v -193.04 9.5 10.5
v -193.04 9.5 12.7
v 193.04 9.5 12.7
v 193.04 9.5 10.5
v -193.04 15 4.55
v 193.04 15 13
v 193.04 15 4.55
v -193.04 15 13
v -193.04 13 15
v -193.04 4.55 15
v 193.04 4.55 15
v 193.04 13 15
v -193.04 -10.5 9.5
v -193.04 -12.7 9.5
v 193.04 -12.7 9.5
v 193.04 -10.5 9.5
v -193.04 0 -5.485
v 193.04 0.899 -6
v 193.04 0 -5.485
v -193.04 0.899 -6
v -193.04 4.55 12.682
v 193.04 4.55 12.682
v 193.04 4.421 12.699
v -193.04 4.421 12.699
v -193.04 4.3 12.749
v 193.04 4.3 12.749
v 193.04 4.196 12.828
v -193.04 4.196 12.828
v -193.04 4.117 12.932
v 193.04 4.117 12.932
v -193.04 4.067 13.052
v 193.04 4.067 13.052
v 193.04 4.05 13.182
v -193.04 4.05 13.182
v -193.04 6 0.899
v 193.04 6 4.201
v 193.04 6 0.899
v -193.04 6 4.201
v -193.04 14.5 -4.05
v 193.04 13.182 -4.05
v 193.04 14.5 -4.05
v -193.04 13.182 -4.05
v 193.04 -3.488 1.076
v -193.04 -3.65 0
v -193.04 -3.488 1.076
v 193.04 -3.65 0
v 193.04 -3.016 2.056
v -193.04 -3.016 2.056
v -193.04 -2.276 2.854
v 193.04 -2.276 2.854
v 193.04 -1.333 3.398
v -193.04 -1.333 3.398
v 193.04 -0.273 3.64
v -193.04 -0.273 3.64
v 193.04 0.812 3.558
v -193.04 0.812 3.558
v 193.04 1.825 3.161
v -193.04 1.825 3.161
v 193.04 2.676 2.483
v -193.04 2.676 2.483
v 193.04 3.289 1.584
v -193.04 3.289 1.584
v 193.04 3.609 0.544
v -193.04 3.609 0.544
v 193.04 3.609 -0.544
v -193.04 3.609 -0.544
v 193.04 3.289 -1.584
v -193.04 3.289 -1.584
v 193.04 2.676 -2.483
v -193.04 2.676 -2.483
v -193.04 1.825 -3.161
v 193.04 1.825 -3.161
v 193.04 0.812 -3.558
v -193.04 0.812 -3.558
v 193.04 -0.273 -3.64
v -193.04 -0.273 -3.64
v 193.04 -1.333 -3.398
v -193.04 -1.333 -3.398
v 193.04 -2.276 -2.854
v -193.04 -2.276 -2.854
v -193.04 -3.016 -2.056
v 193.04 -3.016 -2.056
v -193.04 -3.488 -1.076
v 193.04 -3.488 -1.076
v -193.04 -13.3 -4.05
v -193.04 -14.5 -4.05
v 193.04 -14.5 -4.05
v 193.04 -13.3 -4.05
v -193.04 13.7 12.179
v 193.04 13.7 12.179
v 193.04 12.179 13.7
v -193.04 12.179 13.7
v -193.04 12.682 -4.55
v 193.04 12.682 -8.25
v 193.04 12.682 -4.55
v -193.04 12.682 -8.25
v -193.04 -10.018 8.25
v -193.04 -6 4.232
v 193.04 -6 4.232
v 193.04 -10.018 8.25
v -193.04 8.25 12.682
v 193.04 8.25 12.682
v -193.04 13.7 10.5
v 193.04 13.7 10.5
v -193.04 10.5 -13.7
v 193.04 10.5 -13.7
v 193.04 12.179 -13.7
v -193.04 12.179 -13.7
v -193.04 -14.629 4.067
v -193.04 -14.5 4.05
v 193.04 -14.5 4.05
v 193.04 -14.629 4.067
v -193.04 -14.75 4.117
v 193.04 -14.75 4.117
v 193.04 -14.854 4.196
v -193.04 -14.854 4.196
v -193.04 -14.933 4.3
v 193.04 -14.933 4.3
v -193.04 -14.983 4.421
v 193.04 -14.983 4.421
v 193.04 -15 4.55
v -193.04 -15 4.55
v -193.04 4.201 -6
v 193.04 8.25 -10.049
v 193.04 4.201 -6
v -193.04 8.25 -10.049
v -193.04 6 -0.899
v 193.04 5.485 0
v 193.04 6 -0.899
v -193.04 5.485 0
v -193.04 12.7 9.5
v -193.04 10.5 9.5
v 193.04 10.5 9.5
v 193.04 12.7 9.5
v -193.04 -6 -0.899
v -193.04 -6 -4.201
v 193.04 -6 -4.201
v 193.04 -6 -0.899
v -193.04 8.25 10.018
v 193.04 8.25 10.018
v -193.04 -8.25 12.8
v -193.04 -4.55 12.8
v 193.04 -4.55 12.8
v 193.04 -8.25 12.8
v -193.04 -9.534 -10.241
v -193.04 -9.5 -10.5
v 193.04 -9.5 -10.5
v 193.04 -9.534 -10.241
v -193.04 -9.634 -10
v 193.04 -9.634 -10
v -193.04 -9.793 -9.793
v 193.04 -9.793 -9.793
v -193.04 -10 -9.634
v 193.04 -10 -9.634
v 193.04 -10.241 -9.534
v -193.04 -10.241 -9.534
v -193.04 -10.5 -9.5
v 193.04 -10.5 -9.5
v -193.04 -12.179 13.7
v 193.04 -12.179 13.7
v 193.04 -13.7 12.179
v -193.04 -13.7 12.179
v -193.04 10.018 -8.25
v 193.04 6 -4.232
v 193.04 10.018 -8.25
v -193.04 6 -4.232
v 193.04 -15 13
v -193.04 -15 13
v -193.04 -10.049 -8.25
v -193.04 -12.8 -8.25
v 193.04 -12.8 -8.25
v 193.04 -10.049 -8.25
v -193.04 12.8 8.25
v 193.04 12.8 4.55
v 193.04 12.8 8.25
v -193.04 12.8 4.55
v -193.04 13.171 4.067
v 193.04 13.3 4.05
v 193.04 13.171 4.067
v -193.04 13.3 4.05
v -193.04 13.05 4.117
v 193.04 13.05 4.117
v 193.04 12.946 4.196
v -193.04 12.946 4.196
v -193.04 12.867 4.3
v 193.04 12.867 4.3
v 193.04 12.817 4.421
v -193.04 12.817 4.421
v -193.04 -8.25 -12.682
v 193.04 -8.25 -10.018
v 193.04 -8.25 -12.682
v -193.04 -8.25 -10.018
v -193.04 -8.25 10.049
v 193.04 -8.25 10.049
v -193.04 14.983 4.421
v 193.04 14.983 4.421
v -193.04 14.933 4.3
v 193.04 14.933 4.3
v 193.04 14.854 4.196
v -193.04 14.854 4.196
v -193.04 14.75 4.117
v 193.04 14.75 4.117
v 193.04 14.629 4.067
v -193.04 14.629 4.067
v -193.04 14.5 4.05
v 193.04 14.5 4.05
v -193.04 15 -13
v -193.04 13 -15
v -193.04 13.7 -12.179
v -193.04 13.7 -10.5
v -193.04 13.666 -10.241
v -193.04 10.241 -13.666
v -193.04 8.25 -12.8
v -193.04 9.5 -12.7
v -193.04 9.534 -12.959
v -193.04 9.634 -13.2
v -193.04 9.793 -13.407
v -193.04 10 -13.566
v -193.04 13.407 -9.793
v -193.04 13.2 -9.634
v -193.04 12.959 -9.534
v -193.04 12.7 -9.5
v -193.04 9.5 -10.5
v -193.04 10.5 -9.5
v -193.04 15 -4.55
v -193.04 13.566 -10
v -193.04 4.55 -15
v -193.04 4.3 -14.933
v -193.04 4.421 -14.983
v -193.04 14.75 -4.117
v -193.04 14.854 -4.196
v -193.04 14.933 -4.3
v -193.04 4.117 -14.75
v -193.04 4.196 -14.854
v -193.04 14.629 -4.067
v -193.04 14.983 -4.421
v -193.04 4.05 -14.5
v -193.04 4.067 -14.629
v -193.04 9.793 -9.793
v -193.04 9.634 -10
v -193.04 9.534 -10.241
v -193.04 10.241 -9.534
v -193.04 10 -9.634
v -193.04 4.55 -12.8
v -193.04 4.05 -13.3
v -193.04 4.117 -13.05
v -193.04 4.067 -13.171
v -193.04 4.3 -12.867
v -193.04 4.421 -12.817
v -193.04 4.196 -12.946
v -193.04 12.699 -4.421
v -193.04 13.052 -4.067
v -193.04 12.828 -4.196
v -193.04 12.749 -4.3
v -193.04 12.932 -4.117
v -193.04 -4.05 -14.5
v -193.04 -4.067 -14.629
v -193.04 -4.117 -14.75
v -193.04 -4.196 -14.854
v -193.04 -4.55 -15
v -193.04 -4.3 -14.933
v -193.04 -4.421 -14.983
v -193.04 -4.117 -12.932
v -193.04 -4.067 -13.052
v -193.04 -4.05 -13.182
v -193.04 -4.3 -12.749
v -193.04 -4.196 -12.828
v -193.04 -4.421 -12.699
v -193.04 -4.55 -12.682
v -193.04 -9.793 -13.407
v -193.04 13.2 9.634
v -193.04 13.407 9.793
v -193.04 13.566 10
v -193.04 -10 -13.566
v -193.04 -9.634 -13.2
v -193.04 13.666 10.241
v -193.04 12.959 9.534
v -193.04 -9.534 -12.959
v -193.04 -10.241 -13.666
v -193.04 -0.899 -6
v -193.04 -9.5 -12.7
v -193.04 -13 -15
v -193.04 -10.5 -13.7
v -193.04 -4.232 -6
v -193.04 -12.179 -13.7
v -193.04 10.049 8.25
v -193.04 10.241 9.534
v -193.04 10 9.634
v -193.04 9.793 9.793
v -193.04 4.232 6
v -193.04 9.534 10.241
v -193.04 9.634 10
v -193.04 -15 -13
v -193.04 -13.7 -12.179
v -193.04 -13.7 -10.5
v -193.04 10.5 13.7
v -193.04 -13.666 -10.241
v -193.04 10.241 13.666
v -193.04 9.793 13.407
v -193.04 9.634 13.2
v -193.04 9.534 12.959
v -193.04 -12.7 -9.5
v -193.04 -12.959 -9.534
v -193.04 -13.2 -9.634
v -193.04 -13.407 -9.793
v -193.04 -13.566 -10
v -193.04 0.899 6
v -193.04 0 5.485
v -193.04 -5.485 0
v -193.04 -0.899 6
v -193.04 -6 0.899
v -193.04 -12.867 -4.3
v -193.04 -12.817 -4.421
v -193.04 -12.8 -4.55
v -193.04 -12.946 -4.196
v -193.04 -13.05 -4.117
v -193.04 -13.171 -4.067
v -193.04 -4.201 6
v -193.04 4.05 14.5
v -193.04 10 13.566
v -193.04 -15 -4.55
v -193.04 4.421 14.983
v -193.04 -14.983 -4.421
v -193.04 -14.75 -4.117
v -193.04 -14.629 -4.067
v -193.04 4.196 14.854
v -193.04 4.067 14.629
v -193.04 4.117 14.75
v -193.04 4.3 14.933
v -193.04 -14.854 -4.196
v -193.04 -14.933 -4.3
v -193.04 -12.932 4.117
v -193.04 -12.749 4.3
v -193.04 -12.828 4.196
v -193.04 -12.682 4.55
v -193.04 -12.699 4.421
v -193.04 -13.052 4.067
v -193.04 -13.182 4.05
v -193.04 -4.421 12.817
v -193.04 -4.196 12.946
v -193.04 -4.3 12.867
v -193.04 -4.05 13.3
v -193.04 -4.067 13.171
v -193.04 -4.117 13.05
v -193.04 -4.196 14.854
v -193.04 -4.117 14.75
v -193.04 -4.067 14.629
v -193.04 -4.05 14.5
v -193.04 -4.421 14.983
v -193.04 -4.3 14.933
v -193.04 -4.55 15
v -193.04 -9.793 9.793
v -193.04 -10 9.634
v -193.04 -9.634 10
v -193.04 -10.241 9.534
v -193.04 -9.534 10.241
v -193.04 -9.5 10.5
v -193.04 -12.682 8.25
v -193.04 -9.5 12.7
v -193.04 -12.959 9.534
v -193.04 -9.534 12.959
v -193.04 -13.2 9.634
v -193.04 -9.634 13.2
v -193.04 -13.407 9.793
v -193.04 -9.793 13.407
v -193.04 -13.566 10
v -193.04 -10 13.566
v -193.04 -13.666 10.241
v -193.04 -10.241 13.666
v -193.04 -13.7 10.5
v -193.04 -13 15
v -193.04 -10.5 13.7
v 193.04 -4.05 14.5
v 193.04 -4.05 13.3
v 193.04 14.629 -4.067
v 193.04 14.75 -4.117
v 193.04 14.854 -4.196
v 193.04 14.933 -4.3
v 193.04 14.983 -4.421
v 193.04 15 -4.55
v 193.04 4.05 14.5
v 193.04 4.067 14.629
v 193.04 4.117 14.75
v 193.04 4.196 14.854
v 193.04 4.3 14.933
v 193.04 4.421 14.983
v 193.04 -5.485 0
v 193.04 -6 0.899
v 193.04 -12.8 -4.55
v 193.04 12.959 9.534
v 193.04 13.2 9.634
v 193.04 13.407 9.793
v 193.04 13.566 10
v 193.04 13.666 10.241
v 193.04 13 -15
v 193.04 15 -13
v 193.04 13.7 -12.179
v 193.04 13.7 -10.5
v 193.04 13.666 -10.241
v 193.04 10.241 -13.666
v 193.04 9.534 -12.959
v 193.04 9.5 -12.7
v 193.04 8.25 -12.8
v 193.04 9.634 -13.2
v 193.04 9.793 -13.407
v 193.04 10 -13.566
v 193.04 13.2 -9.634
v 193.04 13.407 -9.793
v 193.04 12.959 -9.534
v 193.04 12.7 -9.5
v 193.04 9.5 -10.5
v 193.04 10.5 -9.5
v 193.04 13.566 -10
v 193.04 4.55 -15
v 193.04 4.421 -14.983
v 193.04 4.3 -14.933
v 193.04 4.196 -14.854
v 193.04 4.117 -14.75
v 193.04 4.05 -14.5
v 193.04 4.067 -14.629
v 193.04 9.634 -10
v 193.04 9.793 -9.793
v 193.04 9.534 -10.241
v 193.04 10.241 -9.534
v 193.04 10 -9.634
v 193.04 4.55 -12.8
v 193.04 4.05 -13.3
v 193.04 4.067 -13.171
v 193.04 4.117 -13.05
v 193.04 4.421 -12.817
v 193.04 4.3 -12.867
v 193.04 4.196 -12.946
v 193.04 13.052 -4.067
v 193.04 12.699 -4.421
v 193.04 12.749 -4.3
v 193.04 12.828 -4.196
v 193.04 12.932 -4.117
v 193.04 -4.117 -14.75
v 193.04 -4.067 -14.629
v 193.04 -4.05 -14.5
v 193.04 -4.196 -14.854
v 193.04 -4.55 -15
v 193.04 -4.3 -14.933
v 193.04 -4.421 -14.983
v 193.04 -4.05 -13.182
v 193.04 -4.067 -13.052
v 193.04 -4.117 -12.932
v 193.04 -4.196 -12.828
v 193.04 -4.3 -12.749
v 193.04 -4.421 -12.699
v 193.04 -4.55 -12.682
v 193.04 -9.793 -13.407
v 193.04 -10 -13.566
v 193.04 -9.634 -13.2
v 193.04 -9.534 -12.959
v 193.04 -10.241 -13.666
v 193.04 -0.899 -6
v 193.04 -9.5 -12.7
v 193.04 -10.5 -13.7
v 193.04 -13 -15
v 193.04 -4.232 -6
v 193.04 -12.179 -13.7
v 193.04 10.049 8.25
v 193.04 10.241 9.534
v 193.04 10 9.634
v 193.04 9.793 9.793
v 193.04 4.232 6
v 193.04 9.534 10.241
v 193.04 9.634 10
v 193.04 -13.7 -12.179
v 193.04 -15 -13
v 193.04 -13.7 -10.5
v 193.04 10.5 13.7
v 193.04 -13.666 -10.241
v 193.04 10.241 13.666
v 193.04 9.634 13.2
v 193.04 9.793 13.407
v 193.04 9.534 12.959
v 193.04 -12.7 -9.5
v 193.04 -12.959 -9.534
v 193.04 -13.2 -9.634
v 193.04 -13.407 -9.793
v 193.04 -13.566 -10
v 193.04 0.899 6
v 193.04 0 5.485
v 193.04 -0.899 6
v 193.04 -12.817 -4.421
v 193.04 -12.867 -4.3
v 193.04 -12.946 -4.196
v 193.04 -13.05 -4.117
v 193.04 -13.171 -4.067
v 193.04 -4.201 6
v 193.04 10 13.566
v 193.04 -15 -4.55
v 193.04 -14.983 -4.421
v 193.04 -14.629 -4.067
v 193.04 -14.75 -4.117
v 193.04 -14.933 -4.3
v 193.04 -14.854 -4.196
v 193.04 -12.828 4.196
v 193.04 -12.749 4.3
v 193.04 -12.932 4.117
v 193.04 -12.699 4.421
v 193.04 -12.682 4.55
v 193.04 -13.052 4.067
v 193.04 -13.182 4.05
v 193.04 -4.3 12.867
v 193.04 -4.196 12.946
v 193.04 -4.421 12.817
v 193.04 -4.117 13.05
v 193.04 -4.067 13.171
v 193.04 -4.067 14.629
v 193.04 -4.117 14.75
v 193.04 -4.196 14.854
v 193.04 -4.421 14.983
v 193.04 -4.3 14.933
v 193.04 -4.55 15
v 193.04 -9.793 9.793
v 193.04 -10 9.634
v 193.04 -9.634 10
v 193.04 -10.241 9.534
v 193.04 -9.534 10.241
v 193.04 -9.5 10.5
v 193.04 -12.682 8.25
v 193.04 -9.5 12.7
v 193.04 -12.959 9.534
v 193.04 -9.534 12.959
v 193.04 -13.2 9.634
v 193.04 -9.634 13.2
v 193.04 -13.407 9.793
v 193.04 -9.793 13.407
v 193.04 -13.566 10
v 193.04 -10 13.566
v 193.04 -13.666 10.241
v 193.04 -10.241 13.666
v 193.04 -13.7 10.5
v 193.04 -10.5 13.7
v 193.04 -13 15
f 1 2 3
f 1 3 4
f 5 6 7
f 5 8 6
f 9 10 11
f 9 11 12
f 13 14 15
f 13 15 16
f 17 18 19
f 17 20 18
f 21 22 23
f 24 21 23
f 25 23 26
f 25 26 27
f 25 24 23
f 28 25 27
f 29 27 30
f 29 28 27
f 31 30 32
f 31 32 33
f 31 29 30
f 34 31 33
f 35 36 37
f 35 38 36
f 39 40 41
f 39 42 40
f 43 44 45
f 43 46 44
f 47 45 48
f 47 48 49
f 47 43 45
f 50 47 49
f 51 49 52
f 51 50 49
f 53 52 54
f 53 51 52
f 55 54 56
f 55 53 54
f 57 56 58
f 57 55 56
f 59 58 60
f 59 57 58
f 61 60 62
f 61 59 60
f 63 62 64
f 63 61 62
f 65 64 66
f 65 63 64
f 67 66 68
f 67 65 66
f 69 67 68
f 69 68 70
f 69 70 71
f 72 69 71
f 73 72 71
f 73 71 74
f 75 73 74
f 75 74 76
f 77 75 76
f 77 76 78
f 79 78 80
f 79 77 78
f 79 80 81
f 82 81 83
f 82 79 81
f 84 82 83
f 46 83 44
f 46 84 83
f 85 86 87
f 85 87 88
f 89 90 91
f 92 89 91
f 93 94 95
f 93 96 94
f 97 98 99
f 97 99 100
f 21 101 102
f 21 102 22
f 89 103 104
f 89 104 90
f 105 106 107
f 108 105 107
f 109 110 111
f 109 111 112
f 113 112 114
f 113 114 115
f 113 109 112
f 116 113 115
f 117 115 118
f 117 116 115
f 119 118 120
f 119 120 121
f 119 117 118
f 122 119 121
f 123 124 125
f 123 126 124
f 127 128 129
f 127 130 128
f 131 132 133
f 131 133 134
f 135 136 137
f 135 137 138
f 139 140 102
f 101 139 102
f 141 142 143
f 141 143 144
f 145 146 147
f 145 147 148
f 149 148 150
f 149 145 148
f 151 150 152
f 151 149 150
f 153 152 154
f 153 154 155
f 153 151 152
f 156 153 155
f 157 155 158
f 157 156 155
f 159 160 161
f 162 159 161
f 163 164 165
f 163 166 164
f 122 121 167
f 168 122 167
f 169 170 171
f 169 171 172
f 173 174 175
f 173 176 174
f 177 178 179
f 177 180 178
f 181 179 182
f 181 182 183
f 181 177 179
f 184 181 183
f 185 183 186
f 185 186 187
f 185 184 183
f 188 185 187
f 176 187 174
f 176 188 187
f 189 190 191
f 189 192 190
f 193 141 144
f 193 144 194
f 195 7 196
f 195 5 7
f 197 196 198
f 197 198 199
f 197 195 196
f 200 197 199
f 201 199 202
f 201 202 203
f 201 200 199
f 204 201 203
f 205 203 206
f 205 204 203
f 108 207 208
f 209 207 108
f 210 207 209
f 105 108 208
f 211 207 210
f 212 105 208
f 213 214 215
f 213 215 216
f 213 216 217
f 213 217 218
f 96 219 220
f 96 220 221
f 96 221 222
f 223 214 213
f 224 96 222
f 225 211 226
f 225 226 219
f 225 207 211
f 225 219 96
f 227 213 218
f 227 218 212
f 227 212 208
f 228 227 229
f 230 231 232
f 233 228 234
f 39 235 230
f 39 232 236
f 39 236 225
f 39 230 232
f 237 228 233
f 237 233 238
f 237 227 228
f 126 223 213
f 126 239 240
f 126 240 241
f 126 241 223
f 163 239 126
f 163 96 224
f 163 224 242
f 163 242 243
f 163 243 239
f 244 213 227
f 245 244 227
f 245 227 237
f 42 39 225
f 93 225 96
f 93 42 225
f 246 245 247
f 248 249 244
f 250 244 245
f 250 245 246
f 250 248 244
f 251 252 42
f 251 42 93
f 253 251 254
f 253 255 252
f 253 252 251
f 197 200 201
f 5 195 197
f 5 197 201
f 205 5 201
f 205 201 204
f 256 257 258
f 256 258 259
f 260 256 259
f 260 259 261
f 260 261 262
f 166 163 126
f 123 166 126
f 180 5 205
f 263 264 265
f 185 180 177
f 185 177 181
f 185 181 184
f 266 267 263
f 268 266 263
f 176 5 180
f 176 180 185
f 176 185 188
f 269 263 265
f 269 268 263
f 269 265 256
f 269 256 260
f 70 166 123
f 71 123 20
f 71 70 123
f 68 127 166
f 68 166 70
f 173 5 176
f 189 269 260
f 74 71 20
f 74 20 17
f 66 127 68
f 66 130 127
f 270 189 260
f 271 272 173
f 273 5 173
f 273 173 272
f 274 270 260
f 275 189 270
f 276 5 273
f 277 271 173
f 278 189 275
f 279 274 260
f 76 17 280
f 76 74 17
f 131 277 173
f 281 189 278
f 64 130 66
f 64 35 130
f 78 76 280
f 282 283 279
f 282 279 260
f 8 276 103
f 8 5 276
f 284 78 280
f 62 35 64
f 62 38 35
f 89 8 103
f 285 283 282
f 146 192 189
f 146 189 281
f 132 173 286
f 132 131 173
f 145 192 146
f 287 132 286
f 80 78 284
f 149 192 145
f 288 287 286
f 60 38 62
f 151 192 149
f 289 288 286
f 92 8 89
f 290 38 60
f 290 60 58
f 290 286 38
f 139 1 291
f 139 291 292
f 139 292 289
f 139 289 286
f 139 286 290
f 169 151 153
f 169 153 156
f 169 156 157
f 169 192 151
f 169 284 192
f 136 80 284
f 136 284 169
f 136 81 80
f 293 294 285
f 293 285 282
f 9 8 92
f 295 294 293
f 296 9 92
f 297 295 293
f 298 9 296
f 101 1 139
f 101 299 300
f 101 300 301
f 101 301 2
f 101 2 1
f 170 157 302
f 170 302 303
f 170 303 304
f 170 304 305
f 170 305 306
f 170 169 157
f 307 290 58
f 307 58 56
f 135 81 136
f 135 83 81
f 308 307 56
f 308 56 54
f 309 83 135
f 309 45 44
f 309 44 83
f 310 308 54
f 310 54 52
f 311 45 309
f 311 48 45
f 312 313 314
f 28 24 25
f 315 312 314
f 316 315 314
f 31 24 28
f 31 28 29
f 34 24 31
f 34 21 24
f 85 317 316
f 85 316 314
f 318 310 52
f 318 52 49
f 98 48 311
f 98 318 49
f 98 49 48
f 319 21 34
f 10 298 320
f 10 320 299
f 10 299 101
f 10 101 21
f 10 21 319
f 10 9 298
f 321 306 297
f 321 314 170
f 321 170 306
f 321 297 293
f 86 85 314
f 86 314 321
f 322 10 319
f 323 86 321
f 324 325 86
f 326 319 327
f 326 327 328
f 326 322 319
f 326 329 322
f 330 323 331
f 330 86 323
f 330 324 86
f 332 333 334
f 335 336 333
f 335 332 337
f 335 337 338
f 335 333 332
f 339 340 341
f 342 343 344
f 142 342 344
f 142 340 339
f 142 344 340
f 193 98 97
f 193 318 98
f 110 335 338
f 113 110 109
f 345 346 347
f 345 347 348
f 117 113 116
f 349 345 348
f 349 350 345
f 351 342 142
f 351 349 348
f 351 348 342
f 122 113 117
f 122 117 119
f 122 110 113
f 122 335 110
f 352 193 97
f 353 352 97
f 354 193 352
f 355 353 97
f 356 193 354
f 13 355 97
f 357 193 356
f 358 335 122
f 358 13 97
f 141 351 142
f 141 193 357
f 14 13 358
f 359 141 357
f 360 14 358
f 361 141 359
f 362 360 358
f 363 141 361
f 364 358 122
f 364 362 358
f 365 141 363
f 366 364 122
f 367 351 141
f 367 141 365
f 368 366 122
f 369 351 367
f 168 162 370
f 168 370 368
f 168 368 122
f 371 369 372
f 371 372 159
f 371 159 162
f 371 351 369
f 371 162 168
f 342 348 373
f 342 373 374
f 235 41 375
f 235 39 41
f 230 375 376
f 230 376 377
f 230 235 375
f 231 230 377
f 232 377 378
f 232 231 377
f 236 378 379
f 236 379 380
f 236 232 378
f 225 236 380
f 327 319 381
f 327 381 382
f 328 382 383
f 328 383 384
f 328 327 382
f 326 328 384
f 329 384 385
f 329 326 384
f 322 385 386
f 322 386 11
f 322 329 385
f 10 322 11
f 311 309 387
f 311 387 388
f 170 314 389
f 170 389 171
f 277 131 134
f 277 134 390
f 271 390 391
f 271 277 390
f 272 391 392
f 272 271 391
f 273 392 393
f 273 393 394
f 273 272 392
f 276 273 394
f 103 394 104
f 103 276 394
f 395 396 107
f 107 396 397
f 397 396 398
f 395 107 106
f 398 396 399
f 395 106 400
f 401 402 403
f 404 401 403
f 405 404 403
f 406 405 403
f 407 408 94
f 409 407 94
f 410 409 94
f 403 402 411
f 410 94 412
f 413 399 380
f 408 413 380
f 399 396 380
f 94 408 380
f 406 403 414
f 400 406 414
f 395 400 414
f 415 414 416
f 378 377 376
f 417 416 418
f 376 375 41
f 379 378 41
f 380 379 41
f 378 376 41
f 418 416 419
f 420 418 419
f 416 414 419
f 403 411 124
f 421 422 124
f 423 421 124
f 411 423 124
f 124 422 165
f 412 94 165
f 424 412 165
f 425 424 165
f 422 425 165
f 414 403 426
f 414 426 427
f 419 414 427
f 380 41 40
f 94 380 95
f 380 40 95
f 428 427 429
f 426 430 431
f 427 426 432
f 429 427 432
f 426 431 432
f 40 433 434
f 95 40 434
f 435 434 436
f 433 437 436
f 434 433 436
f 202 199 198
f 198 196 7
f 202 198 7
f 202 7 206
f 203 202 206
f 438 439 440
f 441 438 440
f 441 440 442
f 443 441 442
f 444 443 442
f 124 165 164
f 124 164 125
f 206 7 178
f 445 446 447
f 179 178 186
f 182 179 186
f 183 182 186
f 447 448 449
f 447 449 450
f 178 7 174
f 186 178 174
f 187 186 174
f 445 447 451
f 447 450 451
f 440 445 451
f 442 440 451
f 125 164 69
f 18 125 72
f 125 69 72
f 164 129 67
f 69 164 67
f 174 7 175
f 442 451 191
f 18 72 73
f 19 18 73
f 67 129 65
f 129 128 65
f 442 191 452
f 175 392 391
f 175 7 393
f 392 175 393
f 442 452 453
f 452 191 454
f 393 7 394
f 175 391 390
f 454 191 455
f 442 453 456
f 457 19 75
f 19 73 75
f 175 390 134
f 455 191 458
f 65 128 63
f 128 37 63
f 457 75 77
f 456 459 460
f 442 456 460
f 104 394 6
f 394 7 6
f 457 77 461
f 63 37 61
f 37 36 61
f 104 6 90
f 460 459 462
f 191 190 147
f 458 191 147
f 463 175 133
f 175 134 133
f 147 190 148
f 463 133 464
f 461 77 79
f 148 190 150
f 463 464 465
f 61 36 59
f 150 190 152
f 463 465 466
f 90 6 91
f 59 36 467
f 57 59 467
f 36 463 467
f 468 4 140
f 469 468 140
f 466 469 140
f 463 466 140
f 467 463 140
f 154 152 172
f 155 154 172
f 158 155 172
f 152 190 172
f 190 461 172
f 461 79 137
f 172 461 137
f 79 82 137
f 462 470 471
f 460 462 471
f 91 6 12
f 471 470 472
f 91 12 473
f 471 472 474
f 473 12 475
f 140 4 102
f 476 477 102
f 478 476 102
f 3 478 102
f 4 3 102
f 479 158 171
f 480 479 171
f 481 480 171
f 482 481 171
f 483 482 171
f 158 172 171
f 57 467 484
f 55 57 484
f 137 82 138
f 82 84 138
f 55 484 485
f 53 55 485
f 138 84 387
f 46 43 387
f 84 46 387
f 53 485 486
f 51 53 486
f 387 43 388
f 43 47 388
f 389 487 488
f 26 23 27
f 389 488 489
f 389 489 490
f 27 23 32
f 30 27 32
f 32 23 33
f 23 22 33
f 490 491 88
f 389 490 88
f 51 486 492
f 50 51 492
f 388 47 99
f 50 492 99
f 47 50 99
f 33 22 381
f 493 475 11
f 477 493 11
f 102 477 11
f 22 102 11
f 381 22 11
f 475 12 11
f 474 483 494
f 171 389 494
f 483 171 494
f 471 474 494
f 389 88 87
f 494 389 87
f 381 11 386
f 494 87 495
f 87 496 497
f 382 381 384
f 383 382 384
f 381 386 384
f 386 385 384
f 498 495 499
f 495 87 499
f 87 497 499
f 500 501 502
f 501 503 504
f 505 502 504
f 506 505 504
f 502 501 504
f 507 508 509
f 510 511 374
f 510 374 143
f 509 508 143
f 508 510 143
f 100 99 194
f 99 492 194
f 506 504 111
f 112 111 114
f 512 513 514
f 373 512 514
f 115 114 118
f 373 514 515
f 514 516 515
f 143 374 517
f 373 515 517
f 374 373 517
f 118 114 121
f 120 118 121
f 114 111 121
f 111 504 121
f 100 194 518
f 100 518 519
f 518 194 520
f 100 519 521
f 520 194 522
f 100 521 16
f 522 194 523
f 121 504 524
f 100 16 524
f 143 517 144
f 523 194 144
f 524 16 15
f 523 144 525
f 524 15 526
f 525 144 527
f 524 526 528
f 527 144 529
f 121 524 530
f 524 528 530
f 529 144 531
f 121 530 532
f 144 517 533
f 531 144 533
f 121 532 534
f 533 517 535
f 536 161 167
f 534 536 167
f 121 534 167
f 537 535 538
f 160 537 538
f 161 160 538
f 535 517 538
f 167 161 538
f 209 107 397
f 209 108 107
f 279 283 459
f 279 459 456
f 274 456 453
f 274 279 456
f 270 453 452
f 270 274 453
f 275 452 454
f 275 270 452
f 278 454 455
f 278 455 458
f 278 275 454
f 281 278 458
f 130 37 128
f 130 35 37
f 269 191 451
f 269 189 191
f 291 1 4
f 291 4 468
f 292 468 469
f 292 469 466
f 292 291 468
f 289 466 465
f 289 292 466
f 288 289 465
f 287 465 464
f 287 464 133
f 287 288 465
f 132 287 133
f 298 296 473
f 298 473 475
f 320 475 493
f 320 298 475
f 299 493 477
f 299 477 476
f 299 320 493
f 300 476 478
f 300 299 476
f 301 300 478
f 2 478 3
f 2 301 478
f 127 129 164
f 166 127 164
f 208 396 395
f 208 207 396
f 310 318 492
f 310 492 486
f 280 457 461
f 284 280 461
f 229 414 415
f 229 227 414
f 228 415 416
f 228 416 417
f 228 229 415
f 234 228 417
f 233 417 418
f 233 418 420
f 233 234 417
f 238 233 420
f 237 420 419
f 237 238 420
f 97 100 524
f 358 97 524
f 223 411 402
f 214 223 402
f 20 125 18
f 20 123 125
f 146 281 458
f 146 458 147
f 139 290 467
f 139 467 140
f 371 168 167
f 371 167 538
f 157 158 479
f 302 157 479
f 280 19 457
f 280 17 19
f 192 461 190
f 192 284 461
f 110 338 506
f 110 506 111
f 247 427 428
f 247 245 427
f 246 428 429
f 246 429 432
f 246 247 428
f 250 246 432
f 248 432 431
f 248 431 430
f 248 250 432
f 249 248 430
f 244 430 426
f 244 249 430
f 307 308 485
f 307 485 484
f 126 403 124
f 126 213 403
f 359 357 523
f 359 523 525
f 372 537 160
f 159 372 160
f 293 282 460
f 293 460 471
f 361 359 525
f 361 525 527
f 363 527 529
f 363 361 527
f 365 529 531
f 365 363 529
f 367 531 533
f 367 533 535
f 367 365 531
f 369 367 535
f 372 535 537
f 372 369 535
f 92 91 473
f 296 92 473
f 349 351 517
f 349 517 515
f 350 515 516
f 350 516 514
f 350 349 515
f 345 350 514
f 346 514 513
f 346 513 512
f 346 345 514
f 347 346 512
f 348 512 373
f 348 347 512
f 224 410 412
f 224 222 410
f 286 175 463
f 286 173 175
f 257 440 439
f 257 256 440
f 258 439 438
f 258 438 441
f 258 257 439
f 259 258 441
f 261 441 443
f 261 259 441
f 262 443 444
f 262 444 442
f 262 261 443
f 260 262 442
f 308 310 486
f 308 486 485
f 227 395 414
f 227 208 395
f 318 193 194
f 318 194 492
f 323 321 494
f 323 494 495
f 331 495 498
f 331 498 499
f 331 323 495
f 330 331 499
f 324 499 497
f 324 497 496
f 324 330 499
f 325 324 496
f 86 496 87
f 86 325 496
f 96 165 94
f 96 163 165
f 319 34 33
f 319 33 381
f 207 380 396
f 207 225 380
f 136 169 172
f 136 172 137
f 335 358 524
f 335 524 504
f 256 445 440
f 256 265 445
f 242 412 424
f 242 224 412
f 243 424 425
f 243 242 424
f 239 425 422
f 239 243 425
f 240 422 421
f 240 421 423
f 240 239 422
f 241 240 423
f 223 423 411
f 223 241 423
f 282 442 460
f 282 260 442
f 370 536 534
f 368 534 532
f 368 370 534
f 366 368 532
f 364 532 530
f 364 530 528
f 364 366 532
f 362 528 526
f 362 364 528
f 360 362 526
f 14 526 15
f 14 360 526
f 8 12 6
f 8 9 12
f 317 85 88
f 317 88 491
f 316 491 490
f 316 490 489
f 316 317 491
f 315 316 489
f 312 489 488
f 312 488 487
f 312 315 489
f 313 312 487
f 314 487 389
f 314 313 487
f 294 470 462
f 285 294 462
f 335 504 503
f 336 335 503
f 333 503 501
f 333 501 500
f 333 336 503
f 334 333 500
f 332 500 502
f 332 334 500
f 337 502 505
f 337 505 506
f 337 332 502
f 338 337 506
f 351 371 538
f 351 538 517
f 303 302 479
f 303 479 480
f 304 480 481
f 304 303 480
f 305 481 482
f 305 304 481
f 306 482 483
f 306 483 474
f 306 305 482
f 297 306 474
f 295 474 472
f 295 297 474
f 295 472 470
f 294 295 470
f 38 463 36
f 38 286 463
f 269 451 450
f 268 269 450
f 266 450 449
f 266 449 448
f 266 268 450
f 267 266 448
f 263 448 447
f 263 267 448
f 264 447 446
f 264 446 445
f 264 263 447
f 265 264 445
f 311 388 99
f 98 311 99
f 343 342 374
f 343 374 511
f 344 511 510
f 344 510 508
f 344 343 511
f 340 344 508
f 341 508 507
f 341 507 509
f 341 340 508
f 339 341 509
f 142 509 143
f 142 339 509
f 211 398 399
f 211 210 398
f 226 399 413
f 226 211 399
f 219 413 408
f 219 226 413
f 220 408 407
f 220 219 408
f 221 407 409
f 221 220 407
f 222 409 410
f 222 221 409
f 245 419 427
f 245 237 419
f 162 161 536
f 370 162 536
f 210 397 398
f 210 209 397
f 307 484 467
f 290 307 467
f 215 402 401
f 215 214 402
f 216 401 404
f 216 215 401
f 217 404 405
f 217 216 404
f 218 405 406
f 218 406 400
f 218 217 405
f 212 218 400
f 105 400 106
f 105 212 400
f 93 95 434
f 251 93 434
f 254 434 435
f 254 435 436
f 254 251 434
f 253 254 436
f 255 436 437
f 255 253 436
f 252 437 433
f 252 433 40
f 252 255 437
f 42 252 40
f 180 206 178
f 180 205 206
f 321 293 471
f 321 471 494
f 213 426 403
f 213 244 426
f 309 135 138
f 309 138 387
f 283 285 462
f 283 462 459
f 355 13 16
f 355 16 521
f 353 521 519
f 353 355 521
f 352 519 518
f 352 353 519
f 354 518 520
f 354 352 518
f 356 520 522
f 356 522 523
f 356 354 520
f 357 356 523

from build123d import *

# Parameters (mm, degrees)
SKETCH1_R          = 3.65
MAIN_EXTRUDE_DEPTH = 193.04


with BuildPart() as part:
    # Sketch1 → main Extrude (new body, symmetric)
    with BuildSketch(Plane(origin=(0, 0, 0), x_dir=(0, -1, 0), z_dir=(-1, 0, 0))):
        with BuildLine():
            Line((4.549996167, -15), (12.999943754, -15))
            Line((12.999943754, -15), (15, -12.999944234))
            Line((15, -12.999944234), (15, -4.54998765))
            ThreePointArc((15, -4.54998765), (14.853553391, -4.19643426), (14.5, -4.04998765))
            Line((14.5, -4.04998765), (13.299974565, -4.04998765))
            ThreePointArc((13.299974565, -4.04998765), (12.946421174, -4.19643426), (12.799974565, -4.54998765))
            Line((12.799974565, -4.54998765), (12.799974565, -8.249978163))
            Line((12.799974565, -8.249978163), (10.04886106, -8.249978163))
            Line((10.04886106, -8.249978163), (5.999989561, -4.201106482))
            Line((5.999989561, -4.201106482), (5.999989561, -0.899233628))
            Line((5.999989561, -0.899233628), (5.484990531, 5.429e-06))
            Line((5.484990531, 5.429e-06), (5.999989561, 0.899244177))
            Line((5.999989561, 0.899244177), (5.999989561, 4.232229952))
            Line((5.999989561, 4.232229952), (10.017749022, 8.249988862))
            Line((10.017749022, 8.249988862), (12.681560202, 8.249988862))
            Line((12.681560202, 8.249988862), (12.681560202, 4.549996167))
            ThreePointArc((12.681560202, 4.549996167), (12.828006812, 4.196442776), (13.181560202, 4.049996167))
            Line((13.181560202, 4.049996167), (14.5, 4.049996167))
            ThreePointArc((14.5, 4.049996167), (14.853553391, 4.196442776), (15, 4.549996167))
            Line((15, 4.549996167), (15, 12.999943159))
            Line((15, 12.999943159), (12.999943639, 15))
            Line((12.999943639, 15), (4.54998765, 15))
            ThreePointArc((4.54998765, 15), (4.19643426, 14.853553391), (4.04998765, 14.5))
            Line((4.04998765, 14.5), (4.04998765, 13.299974565))
            ThreePointArc((4.04998765, 13.299974565), (4.19643426, 12.946421174), (4.54998765, 12.799974565))
            Line((4.54998765, 12.799974565), (8.249978163, 12.799974565))
            Line((8.249978163, 12.799974565), (8.249978163, 10.04886106))
            Line((8.249978163, 10.04886106), (4.201106482, 5.999989561))
            Line((4.201106482, 5.999989561), (0.899233628, 5.999989561))
            Line((0.899233628, 5.999989561), (-5.358e-06, 5.484990655))
            Line((-5.358e-06, 5.484990655), (-0.899244177, 5.999989561))
            Line((-0.899244177, 5.999989561), (-4.232229952, 5.999989561))
            Line((-4.232229952, 5.999989561), (-8.249988862, 10.017749022))
            Line((-8.249988862, 10.017749022), (-8.249988862, 12.681560202))
            Line((-8.249988862, 12.681560202), (-4.549996167, 12.681560202))
            ThreePointArc((-4.549996167, 12.681560202), (-4.196442776, 12.828006812), (-4.049996167, 13.181560202))
            Line((-4.049996167, 13.181560202), (-4.049996167, 14.5))
            ThreePointArc((-4.049996167, 14.5), (-4.196442776, 14.853553391), (-4.549996167, 15))
            Line((-4.549996167, 15), (-12.999943355, 15))
            Line((-12.999943355, 15), (-15, 12.999943836))
            Line((-15, 12.999943836), (-15, 4.54998765))
            ThreePointArc((-15, 4.54998765), (-14.853553391, 4.19643426), (-14.5, 4.04998765))
            Line((-14.5, 4.04998765), (-13.299974565, 4.04998765))
            ThreePointArc((-13.299974565, 4.04998765), (-12.946421174, 4.19643426), (-12.799974565, 4.54998765))
            Line((-12.799974565, 4.54998765), (-12.799974565, 8.249978163))
            Line((-12.799974565, 8.249978163), (-10.048860846, 8.249978163))
            Line((-10.048860846, 8.249978163), (-5.999989347, 4.201106482))
            Line((-5.999989347, 4.201106482), (-5.999989347, 0.899233628))
            Line((-5.999989347, 0.899233628), (-5.484990531, -5.429e-06))
            Line((-5.484990531, -5.429e-06), (-5.999989347, -0.899244177))
            Line((-5.999989347, -0.899244177), (-5.999989347, -4.232229952))
            Line((-5.999989347, -4.232229952), (-10.017748808, -8.249988862))
            Line((-10.017748808, -8.249988862), (-12.681560202, -8.249988862))
            Line((-12.681560202, -8.249988862), (-12.681560202, -4.549996167))
            ThreePointArc((-12.681560202, -4.549996167), (-12.828006812, -4.196442776), (-13.181560202, -4.049996167))
            Line((-13.181560202, -4.049996167), (-14.5, -4.049996167))
            ThreePointArc((-14.5, -4.049996167), (-14.853553391, -4.196442776), (-15, -4.549996167))
            Line((-15, -4.549996167), (-15, -12.999948112))
            Line((-15, -12.999948112), (-12.999947631, -15))
            Line((-12.999947631, -15), (-4.54998765, -15))
            ThreePointArc((-4.54998765, -15), (-4.19643426, -14.853553391), (-4.04998765, -14.5))
            Line((-4.04998765, -14.5), (-4.04998765, -13.299974565))
            ThreePointArc((-4.04998765, -13.299974565), (-4.19643426, -12.946421174), (-4.54998765, -12.799974565))
            Line((-4.54998765, -12.799974565), (-8.249978163, -12.799974565))
            Line((-8.249978163, -12.799974565), (-8.249978163, -10.048860449))
            Line((-8.249978163, -10.048860449), (-4.201106482, -5.999988951))
            Line((-4.201106482, -5.999988951), (-0.899233628, -5.999988951))
            Line((-0.899233628, -5.999988951), (5.367e-06, -5.484990026))
            Line((5.367e-06, -5.484990026), (0.899244177, -5.999988951))
            Line((0.899244177, -5.999988951), (4.232229952, -5.999988951))
            Line((4.232229952, -5.999988951), (8.249988862, -10.017748412))
            Line((8.249988862, -10.017748412), (8.249988862, -12.681560202))
            Line((8.249988862, -12.681560202), (4.549996167, -12.681560202))
            ThreePointArc((4.549996167, -12.681560202), (4.196442776, -12.828006812), (4.049996167, -13.181560202))
            Line((4.049996167, -13.181560202), (4.049996167, -14.5))
            ThreePointArc((4.049996167, -14.5), (4.196442776, -14.853553391), (4.549996167, -15))
        make_face()
        Circle(SKETCH1_R, mode=Mode.SUBTRACT)
        with BuildLine():
            Line((-10.499978684, 9.499980695), (-12.6999746, 9.499980695))
            ThreePointArc((-12.6999746, 9.499980695), (-13.407079967, 9.792873328), (-13.6999726, 10.499978695))
            Line((-13.6999726, 10.499978695), (-13.6999726, 12.178655581))
            Line((-13.6999726, 12.178655581), (-12.178655571, 13.69997261))
            Line((-12.178655571, 13.69997261), (-10.499978695, 13.69997261))
            ThreePointArc((-10.499978695, 13.69997261), (-9.79287332, 13.407079974), (-9.499980684, 12.6999746))
            Line((-9.499980684, 12.6999746), (-9.499980684, 10.499978695))
            ThreePointArc((-9.499980684, 10.499978695), (-9.792873317, 9.792873328), (-10.499978684, 9.499980695))
        make_face(mode=Mode.SUBTRACT)
        with BuildLine():
            Line((9.499981, 10.499978695), (9.499981, 12.69997461))
            ThreePointArc((9.499981, 12.69997461), (9.792873633, 13.407079977), (10.499979, 13.69997261))
            Line((10.499979, 13.69997261), (12.178655581, 13.69997261))
            Line((12.178655581, 13.69997261), (13.69997261, 12.178655581))
            Line((13.69997261, 12.178655581), (13.69997261, 10.499978705))
            ThreePointArc((13.69997261, 10.499978705), (13.407079974, 9.792873331), (12.6999746, 9.499980695))
            Line((12.6999746, 9.499980695), (10.499979, 9.499980695))
            ThreePointArc((10.499979, 9.499980695), (9.792873633, 9.792873328), (9.499981, 10.499978695))
        make_face(mode=Mode.SUBTRACT)
        with BuildLine():
            Line((10.499979, -9.49998099), (12.69997461, -9.49998099))
            ThreePointArc((12.69997461, -9.49998099), (13.407079977, -9.792873623), (13.69997261, -10.49997899))
            Line((13.69997261, -10.49997899), (13.69997261, -12.178655571))
            Line((13.69997261, -12.178655571), (12.178655581, -13.6999726))
            Line((12.178655581, -13.6999726), (10.49997901, -13.6999726))
            ThreePointArc((10.49997901, -13.6999726), (9.792873636, -13.407079964), (9.499981, -12.69997459))
            Line((9.499981, -12.69997459), (9.499981, -10.49997899))
            ThreePointArc((9.499981, -10.49997899), (9.792873633, -9.792873623), (10.499979, -9.49998099))
        make_face(mode=Mode.SUBTRACT)
        with BuildLine():
            Line((-9.499980684, -10.49997899), (-9.499980684, -12.6999746))
            ThreePointArc((-9.499980684, -12.6999746), (-9.792873317, -13.407079967), (-10.499978684, -13.6999726))
            Line((-10.499978684, -13.6999726), (-12.178655571, -13.6999726))
            Line((-12.178655571, -13.6999726), (-13.6999726, -12.178655571))
            Line((-13.6999726, -12.178655571), (-13.6999726, -10.499979))
            ThreePointArc((-13.6999726, -10.499979), (-13.407079964, -9.792873626), (-12.69997459, -9.49998099))
            Line((-12.69997459, -9.49998099), (-10.499978684, -9.49998099))
            ThreePointArc((-10.499978684, -9.49998099), (-9.792873317, -9.792873623), (-9.499980684, -10.49997899))
        make_face(mode=Mode.SUBTRACT)
    extrude(amount=MAIN_EXTRUDE_DEPTH, both=True)


solid = part.part
